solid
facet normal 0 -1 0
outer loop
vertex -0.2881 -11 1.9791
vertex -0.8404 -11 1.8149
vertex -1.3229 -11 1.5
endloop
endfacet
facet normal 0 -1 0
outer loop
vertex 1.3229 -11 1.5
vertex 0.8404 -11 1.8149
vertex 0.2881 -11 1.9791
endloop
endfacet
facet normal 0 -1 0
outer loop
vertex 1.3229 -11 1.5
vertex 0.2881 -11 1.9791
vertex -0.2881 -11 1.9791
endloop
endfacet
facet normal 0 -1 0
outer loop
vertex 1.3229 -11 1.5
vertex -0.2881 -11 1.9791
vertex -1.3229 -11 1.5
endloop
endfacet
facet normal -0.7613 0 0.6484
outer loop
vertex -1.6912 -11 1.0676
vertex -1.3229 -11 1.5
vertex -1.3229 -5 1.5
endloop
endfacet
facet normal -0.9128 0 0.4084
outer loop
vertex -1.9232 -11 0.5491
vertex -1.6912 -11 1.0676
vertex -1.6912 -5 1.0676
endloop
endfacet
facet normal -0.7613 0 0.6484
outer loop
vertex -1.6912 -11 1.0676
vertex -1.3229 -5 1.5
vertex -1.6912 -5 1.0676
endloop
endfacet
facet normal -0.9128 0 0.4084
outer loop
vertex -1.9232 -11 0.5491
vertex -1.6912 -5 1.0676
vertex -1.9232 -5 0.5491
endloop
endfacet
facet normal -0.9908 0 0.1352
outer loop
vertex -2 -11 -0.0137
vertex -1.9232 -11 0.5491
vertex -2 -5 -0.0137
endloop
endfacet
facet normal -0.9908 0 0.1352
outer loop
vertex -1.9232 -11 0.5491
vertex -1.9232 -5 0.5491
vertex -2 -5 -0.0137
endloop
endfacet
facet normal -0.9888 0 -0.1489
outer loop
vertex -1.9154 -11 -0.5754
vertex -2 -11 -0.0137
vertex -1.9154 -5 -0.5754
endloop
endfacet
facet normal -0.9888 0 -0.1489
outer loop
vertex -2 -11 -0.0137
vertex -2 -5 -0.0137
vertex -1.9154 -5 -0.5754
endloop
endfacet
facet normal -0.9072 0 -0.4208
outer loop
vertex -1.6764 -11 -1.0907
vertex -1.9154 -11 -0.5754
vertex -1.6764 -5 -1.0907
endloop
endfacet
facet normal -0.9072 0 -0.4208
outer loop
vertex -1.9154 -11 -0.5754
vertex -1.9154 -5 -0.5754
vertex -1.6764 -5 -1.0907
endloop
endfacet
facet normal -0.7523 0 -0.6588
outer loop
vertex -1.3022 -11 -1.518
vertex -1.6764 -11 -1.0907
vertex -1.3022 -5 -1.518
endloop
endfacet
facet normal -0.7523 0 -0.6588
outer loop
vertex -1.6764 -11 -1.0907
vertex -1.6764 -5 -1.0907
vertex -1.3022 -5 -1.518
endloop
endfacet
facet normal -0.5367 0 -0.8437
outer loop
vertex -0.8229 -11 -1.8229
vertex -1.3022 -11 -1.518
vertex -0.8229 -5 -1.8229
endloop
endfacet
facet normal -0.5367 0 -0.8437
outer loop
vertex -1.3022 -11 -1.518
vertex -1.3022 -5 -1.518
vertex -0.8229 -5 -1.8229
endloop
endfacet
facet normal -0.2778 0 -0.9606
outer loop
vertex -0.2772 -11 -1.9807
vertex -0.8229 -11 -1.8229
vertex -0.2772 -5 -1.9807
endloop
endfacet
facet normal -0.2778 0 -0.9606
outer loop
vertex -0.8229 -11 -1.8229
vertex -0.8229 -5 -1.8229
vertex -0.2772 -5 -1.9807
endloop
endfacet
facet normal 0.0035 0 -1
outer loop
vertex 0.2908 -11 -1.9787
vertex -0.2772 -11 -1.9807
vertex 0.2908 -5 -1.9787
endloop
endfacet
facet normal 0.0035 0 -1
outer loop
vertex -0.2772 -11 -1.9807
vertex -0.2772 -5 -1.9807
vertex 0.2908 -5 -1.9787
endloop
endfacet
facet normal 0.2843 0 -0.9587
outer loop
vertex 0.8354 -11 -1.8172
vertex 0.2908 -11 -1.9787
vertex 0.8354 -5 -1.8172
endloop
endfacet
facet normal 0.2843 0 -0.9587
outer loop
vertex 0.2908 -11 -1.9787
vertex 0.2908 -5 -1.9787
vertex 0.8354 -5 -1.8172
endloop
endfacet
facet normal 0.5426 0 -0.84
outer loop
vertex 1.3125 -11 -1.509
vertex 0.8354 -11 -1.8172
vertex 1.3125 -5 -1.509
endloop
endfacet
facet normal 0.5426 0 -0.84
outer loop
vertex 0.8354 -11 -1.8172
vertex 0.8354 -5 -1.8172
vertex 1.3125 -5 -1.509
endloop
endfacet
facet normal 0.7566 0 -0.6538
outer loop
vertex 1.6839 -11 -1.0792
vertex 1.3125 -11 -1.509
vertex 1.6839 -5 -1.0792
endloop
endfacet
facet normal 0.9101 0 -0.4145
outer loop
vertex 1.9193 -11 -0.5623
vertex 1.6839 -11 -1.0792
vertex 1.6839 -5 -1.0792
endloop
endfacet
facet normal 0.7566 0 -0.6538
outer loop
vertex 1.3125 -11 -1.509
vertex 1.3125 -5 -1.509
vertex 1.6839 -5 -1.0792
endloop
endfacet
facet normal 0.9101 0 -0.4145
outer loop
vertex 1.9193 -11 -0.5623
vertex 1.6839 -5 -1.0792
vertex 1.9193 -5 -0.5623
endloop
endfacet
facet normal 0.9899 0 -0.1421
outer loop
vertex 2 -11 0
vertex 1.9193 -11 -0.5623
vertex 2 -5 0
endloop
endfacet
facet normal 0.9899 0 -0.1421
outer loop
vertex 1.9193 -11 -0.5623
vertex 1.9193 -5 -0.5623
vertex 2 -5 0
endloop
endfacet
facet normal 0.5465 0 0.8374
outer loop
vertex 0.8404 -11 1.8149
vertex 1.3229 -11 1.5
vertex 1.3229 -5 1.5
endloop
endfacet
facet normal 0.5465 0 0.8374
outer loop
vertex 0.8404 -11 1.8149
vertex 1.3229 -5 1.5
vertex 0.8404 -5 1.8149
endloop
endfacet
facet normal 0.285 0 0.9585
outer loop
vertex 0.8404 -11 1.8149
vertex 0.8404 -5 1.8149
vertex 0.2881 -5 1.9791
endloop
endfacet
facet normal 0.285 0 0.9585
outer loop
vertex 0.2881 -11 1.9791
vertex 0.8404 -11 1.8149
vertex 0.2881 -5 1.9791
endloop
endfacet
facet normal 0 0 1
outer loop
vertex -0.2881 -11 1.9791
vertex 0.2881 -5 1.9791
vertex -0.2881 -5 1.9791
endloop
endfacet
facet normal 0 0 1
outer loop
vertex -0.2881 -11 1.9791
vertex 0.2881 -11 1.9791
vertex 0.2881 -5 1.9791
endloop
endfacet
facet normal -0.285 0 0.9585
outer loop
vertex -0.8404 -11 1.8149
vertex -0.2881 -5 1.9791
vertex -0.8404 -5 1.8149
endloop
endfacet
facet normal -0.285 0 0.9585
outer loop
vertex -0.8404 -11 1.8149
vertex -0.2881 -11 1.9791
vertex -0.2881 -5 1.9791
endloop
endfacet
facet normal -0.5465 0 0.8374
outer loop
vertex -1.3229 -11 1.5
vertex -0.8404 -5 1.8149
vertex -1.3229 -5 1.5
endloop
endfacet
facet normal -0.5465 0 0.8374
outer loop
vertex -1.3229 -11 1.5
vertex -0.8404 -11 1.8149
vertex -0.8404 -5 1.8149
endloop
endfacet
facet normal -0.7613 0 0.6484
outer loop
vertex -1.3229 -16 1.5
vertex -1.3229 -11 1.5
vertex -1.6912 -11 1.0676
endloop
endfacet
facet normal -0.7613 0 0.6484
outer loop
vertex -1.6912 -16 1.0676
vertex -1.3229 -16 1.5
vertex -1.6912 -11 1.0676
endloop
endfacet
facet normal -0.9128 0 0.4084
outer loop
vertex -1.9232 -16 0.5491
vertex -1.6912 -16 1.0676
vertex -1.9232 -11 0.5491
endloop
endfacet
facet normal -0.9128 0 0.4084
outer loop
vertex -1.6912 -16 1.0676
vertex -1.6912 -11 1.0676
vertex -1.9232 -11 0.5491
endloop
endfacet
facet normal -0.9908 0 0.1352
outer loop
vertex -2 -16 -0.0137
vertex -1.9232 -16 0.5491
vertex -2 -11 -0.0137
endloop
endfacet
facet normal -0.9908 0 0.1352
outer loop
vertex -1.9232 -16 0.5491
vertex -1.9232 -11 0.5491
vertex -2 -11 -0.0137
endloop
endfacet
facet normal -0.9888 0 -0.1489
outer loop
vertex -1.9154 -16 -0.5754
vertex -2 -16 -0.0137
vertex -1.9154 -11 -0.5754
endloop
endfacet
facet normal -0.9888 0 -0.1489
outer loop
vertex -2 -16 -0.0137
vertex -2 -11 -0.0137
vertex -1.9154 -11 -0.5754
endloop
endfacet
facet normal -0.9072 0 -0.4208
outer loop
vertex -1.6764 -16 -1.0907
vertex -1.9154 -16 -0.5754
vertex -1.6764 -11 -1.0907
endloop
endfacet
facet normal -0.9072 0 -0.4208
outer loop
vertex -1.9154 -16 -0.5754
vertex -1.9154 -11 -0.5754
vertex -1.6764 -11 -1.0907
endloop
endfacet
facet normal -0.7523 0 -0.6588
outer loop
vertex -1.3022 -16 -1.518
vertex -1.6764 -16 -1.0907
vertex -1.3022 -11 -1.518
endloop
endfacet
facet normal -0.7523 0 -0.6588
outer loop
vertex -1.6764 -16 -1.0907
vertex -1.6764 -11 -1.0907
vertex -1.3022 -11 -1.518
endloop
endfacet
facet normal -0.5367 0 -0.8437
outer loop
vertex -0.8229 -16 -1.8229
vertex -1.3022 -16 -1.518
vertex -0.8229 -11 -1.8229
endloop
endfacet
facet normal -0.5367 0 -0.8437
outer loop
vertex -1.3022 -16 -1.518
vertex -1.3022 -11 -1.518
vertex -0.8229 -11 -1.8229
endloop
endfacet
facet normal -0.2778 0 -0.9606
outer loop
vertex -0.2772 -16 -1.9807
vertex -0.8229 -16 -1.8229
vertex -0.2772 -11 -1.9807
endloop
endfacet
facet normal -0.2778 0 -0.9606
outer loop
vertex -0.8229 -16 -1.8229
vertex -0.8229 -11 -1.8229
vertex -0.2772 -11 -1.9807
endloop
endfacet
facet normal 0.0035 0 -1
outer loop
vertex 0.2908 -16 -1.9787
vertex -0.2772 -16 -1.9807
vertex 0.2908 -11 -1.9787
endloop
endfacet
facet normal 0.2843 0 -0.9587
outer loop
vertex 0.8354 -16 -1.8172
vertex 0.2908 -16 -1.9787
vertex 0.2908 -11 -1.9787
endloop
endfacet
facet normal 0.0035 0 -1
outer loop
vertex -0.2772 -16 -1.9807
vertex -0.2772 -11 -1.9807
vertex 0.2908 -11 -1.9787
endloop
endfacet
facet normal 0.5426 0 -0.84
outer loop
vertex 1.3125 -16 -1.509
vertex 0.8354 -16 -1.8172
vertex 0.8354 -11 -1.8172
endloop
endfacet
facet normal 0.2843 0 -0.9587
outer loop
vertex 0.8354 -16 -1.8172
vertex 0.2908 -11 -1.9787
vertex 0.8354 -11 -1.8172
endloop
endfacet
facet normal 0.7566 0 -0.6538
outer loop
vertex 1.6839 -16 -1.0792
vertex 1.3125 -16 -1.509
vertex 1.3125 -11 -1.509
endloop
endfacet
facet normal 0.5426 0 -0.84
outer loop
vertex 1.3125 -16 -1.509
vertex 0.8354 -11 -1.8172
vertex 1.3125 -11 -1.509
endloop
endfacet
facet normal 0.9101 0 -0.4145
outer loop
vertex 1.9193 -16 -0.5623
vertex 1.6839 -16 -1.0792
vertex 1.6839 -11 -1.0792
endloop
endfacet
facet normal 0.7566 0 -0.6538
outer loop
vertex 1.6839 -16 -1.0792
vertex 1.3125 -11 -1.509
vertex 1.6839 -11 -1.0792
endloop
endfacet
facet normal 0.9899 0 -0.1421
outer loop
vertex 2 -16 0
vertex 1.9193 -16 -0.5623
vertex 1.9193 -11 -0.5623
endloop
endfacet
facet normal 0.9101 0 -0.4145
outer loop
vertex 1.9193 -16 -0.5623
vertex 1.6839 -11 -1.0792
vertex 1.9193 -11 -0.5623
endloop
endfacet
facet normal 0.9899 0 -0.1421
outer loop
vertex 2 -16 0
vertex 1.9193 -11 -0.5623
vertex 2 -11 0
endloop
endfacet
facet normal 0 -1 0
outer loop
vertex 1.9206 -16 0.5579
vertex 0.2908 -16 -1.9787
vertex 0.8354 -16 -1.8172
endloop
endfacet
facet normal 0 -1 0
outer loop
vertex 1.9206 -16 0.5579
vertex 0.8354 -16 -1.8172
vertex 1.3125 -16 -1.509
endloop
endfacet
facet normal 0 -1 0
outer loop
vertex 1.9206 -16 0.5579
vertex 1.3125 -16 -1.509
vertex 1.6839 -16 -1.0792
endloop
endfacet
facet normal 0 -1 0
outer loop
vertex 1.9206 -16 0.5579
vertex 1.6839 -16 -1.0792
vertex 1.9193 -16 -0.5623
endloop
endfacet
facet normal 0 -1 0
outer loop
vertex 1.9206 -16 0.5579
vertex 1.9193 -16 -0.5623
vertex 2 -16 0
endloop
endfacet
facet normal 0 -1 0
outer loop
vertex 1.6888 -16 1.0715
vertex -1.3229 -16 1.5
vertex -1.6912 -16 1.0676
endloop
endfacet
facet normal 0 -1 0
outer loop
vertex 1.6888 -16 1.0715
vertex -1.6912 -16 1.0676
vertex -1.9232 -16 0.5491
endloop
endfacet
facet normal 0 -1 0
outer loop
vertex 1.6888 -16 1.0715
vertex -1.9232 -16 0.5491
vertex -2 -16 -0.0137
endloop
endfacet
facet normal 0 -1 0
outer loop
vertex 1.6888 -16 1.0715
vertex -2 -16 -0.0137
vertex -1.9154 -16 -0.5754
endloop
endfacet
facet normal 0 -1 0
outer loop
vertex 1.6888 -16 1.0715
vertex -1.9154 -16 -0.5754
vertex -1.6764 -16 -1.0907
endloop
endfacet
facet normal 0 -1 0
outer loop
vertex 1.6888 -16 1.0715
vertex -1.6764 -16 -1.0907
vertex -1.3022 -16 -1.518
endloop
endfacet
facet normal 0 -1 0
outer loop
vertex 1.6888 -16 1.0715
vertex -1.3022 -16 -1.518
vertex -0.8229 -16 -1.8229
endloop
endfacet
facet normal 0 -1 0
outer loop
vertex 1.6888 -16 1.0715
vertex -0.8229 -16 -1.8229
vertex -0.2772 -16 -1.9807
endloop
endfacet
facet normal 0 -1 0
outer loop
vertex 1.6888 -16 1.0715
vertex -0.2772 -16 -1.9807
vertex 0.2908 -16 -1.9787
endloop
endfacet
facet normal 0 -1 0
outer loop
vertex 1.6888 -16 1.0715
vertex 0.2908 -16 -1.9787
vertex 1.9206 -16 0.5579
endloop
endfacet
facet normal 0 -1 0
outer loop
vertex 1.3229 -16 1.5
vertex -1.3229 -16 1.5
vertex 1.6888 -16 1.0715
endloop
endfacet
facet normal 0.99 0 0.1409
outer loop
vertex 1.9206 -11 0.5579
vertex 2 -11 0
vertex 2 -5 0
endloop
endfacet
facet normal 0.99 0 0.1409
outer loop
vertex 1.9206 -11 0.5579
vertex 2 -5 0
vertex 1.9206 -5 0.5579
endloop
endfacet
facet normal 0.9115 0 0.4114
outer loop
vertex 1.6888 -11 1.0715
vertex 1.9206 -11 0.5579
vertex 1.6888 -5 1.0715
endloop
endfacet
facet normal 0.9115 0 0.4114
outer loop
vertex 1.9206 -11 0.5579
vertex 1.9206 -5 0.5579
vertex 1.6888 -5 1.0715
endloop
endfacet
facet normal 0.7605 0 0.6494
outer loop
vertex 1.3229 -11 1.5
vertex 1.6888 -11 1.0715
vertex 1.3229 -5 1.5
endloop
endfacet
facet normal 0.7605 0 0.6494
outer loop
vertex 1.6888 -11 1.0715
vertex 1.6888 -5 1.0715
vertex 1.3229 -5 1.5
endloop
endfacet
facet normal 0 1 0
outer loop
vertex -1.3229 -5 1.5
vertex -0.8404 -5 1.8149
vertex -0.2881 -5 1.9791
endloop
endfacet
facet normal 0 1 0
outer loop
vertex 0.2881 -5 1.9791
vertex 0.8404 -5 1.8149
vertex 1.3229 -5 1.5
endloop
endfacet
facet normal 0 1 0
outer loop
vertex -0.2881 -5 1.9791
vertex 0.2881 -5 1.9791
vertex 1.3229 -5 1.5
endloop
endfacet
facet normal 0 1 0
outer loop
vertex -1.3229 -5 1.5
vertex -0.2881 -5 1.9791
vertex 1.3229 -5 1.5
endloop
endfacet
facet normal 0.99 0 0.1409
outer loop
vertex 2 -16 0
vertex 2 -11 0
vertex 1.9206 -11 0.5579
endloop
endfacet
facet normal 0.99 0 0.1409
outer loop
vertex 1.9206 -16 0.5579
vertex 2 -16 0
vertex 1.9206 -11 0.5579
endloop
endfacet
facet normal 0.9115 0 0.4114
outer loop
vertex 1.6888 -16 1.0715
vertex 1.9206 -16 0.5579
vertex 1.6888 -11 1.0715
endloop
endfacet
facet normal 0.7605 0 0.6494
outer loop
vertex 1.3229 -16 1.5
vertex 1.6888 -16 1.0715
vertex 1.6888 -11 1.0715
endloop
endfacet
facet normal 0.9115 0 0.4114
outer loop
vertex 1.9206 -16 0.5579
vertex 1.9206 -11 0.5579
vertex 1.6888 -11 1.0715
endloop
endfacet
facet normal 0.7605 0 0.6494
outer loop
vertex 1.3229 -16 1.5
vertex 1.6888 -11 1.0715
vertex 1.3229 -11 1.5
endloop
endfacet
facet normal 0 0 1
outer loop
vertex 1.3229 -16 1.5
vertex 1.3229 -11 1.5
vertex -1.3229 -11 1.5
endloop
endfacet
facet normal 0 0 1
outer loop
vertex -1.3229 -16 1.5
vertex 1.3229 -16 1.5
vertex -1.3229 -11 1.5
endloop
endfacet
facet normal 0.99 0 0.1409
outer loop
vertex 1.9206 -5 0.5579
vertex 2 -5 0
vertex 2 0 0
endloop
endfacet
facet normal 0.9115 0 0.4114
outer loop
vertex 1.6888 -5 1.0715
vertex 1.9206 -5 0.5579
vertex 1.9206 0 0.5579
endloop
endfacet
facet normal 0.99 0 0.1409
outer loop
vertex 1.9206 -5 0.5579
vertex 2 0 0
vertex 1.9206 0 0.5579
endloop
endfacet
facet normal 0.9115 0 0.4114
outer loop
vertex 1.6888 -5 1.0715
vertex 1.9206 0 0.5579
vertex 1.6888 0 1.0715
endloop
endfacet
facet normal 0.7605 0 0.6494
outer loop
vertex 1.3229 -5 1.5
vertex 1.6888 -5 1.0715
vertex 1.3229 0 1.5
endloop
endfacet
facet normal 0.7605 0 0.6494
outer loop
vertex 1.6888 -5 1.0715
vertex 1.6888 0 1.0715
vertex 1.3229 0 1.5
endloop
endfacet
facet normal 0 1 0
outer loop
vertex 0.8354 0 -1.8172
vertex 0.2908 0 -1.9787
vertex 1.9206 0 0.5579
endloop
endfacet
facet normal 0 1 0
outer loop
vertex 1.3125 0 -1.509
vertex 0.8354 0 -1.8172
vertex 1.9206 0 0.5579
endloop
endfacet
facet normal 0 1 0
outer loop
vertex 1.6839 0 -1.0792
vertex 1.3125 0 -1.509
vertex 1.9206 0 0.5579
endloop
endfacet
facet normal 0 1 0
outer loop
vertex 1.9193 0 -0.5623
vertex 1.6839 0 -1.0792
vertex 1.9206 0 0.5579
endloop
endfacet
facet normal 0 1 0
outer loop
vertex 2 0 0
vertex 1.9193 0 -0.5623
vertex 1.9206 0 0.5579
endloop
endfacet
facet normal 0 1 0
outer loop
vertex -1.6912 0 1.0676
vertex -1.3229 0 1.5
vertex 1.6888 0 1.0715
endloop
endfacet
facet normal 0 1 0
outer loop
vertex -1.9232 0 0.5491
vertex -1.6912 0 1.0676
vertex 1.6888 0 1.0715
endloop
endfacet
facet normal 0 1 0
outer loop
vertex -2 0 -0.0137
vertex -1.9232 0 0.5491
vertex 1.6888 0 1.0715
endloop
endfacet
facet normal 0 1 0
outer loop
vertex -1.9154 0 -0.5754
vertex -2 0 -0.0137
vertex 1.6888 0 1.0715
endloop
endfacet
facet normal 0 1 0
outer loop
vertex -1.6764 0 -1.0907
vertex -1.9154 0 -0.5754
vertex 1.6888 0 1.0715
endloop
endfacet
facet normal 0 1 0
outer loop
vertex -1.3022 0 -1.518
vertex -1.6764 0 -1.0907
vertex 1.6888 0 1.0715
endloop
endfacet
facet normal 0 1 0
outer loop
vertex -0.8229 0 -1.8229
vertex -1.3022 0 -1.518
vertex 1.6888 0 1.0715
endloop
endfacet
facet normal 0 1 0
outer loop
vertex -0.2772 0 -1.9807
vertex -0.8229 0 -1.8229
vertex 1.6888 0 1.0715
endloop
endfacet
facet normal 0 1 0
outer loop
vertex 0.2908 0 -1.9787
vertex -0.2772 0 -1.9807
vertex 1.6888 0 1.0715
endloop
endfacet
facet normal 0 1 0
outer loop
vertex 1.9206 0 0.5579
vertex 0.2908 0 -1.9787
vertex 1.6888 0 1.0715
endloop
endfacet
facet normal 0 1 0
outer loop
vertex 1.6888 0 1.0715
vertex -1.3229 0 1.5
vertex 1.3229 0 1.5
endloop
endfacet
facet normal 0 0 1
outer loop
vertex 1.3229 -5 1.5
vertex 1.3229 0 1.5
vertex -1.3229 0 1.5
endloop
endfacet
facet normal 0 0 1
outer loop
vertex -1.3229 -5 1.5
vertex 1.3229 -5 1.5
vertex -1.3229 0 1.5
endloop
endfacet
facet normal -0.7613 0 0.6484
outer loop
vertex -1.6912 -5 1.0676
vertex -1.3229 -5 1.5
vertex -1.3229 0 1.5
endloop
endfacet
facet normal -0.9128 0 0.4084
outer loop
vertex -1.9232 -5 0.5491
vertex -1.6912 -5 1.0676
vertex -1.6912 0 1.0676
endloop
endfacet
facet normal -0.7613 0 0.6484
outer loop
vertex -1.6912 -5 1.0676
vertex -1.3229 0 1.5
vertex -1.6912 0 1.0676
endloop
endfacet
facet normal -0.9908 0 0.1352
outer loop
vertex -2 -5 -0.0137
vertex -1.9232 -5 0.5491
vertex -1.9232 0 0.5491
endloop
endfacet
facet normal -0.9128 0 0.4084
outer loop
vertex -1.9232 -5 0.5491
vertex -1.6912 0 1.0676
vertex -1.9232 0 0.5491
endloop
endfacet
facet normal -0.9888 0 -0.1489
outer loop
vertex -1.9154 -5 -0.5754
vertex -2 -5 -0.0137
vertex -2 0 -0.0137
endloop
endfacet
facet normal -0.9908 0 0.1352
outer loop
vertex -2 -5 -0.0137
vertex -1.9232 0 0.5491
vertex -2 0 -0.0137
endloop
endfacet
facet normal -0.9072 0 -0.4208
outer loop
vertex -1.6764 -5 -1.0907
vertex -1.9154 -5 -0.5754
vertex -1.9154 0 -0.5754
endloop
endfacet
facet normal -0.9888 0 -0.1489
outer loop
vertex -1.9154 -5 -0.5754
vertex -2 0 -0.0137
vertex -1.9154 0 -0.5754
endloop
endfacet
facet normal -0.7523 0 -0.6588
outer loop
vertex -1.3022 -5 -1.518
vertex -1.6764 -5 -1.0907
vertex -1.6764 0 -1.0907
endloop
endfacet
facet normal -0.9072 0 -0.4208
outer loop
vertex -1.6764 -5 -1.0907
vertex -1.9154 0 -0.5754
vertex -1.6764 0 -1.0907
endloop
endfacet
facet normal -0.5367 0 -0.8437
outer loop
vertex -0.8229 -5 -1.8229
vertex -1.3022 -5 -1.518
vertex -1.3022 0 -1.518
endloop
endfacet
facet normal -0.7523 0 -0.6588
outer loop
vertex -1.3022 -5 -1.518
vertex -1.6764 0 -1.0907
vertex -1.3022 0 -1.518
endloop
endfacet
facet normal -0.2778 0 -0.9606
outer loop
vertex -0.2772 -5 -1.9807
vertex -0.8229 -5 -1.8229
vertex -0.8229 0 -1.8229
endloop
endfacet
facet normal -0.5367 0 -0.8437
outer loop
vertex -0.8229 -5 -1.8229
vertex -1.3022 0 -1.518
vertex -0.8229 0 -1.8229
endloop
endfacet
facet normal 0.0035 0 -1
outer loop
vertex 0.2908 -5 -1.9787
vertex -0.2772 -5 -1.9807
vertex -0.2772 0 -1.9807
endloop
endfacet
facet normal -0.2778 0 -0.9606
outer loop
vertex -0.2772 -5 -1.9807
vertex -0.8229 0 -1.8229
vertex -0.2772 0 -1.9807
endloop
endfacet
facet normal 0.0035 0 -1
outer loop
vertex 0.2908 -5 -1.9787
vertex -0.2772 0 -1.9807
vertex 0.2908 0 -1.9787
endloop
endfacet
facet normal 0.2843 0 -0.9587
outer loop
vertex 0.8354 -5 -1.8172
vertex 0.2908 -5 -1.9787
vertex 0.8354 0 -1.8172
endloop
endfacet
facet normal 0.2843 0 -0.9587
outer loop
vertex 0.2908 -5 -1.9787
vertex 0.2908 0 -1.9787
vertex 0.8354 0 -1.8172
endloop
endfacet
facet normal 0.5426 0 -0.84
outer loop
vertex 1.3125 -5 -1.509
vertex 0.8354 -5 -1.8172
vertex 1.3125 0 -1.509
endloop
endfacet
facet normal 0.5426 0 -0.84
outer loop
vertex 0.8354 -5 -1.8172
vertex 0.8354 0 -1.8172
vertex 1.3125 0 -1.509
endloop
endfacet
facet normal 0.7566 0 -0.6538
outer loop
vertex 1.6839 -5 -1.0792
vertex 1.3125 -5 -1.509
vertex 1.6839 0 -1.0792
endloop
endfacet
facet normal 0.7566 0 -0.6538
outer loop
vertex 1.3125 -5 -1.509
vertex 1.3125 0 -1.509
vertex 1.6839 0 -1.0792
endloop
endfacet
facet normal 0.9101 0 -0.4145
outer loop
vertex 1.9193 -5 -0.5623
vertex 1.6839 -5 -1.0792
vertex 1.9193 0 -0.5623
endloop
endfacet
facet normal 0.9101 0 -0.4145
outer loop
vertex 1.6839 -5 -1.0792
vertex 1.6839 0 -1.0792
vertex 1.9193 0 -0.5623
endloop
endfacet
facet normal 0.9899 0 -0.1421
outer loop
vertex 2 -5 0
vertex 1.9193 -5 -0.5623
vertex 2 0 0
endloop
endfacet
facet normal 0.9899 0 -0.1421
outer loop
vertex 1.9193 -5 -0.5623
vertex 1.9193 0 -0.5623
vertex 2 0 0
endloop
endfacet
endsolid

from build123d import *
from build123d import SkipClean  # not in build123d's __all__

# Parameters (mm, degrees)
F1_DEPTH = 16
F3_START = -5
F2_R     = 2
F3_DEPTH = 6


with BuildPart() as f1:
    # F0 (on Front) → F1 (new body)
    with BuildSketch(Plane.XZ):
        with BuildLine():
            ThreePointArc((-1.3228756555, 1.5), (-0.8228756555, -1.8228756555), (2, 0))
            ThreePointArc((2, 0), (1.8228756555, 0.8228756555), (1.3228756555, 1.5))
            Line((1.3228756555, 1.5), (-1.3228756555, 1.5))
        make_face()
    extrude(amount=F1_DEPTH)

    # F2 (on face) → F3 (join)
    with BuildSketch(Plane.XZ.offset(16).offset(F3_START)):
        Circle(F2_R)
    with SkipClean():  # cleaning this boolean's faces spoils the solid; the shape is the same uncleaned
        extrude(amount=-F3_DEPTH)


solid = f1.part
